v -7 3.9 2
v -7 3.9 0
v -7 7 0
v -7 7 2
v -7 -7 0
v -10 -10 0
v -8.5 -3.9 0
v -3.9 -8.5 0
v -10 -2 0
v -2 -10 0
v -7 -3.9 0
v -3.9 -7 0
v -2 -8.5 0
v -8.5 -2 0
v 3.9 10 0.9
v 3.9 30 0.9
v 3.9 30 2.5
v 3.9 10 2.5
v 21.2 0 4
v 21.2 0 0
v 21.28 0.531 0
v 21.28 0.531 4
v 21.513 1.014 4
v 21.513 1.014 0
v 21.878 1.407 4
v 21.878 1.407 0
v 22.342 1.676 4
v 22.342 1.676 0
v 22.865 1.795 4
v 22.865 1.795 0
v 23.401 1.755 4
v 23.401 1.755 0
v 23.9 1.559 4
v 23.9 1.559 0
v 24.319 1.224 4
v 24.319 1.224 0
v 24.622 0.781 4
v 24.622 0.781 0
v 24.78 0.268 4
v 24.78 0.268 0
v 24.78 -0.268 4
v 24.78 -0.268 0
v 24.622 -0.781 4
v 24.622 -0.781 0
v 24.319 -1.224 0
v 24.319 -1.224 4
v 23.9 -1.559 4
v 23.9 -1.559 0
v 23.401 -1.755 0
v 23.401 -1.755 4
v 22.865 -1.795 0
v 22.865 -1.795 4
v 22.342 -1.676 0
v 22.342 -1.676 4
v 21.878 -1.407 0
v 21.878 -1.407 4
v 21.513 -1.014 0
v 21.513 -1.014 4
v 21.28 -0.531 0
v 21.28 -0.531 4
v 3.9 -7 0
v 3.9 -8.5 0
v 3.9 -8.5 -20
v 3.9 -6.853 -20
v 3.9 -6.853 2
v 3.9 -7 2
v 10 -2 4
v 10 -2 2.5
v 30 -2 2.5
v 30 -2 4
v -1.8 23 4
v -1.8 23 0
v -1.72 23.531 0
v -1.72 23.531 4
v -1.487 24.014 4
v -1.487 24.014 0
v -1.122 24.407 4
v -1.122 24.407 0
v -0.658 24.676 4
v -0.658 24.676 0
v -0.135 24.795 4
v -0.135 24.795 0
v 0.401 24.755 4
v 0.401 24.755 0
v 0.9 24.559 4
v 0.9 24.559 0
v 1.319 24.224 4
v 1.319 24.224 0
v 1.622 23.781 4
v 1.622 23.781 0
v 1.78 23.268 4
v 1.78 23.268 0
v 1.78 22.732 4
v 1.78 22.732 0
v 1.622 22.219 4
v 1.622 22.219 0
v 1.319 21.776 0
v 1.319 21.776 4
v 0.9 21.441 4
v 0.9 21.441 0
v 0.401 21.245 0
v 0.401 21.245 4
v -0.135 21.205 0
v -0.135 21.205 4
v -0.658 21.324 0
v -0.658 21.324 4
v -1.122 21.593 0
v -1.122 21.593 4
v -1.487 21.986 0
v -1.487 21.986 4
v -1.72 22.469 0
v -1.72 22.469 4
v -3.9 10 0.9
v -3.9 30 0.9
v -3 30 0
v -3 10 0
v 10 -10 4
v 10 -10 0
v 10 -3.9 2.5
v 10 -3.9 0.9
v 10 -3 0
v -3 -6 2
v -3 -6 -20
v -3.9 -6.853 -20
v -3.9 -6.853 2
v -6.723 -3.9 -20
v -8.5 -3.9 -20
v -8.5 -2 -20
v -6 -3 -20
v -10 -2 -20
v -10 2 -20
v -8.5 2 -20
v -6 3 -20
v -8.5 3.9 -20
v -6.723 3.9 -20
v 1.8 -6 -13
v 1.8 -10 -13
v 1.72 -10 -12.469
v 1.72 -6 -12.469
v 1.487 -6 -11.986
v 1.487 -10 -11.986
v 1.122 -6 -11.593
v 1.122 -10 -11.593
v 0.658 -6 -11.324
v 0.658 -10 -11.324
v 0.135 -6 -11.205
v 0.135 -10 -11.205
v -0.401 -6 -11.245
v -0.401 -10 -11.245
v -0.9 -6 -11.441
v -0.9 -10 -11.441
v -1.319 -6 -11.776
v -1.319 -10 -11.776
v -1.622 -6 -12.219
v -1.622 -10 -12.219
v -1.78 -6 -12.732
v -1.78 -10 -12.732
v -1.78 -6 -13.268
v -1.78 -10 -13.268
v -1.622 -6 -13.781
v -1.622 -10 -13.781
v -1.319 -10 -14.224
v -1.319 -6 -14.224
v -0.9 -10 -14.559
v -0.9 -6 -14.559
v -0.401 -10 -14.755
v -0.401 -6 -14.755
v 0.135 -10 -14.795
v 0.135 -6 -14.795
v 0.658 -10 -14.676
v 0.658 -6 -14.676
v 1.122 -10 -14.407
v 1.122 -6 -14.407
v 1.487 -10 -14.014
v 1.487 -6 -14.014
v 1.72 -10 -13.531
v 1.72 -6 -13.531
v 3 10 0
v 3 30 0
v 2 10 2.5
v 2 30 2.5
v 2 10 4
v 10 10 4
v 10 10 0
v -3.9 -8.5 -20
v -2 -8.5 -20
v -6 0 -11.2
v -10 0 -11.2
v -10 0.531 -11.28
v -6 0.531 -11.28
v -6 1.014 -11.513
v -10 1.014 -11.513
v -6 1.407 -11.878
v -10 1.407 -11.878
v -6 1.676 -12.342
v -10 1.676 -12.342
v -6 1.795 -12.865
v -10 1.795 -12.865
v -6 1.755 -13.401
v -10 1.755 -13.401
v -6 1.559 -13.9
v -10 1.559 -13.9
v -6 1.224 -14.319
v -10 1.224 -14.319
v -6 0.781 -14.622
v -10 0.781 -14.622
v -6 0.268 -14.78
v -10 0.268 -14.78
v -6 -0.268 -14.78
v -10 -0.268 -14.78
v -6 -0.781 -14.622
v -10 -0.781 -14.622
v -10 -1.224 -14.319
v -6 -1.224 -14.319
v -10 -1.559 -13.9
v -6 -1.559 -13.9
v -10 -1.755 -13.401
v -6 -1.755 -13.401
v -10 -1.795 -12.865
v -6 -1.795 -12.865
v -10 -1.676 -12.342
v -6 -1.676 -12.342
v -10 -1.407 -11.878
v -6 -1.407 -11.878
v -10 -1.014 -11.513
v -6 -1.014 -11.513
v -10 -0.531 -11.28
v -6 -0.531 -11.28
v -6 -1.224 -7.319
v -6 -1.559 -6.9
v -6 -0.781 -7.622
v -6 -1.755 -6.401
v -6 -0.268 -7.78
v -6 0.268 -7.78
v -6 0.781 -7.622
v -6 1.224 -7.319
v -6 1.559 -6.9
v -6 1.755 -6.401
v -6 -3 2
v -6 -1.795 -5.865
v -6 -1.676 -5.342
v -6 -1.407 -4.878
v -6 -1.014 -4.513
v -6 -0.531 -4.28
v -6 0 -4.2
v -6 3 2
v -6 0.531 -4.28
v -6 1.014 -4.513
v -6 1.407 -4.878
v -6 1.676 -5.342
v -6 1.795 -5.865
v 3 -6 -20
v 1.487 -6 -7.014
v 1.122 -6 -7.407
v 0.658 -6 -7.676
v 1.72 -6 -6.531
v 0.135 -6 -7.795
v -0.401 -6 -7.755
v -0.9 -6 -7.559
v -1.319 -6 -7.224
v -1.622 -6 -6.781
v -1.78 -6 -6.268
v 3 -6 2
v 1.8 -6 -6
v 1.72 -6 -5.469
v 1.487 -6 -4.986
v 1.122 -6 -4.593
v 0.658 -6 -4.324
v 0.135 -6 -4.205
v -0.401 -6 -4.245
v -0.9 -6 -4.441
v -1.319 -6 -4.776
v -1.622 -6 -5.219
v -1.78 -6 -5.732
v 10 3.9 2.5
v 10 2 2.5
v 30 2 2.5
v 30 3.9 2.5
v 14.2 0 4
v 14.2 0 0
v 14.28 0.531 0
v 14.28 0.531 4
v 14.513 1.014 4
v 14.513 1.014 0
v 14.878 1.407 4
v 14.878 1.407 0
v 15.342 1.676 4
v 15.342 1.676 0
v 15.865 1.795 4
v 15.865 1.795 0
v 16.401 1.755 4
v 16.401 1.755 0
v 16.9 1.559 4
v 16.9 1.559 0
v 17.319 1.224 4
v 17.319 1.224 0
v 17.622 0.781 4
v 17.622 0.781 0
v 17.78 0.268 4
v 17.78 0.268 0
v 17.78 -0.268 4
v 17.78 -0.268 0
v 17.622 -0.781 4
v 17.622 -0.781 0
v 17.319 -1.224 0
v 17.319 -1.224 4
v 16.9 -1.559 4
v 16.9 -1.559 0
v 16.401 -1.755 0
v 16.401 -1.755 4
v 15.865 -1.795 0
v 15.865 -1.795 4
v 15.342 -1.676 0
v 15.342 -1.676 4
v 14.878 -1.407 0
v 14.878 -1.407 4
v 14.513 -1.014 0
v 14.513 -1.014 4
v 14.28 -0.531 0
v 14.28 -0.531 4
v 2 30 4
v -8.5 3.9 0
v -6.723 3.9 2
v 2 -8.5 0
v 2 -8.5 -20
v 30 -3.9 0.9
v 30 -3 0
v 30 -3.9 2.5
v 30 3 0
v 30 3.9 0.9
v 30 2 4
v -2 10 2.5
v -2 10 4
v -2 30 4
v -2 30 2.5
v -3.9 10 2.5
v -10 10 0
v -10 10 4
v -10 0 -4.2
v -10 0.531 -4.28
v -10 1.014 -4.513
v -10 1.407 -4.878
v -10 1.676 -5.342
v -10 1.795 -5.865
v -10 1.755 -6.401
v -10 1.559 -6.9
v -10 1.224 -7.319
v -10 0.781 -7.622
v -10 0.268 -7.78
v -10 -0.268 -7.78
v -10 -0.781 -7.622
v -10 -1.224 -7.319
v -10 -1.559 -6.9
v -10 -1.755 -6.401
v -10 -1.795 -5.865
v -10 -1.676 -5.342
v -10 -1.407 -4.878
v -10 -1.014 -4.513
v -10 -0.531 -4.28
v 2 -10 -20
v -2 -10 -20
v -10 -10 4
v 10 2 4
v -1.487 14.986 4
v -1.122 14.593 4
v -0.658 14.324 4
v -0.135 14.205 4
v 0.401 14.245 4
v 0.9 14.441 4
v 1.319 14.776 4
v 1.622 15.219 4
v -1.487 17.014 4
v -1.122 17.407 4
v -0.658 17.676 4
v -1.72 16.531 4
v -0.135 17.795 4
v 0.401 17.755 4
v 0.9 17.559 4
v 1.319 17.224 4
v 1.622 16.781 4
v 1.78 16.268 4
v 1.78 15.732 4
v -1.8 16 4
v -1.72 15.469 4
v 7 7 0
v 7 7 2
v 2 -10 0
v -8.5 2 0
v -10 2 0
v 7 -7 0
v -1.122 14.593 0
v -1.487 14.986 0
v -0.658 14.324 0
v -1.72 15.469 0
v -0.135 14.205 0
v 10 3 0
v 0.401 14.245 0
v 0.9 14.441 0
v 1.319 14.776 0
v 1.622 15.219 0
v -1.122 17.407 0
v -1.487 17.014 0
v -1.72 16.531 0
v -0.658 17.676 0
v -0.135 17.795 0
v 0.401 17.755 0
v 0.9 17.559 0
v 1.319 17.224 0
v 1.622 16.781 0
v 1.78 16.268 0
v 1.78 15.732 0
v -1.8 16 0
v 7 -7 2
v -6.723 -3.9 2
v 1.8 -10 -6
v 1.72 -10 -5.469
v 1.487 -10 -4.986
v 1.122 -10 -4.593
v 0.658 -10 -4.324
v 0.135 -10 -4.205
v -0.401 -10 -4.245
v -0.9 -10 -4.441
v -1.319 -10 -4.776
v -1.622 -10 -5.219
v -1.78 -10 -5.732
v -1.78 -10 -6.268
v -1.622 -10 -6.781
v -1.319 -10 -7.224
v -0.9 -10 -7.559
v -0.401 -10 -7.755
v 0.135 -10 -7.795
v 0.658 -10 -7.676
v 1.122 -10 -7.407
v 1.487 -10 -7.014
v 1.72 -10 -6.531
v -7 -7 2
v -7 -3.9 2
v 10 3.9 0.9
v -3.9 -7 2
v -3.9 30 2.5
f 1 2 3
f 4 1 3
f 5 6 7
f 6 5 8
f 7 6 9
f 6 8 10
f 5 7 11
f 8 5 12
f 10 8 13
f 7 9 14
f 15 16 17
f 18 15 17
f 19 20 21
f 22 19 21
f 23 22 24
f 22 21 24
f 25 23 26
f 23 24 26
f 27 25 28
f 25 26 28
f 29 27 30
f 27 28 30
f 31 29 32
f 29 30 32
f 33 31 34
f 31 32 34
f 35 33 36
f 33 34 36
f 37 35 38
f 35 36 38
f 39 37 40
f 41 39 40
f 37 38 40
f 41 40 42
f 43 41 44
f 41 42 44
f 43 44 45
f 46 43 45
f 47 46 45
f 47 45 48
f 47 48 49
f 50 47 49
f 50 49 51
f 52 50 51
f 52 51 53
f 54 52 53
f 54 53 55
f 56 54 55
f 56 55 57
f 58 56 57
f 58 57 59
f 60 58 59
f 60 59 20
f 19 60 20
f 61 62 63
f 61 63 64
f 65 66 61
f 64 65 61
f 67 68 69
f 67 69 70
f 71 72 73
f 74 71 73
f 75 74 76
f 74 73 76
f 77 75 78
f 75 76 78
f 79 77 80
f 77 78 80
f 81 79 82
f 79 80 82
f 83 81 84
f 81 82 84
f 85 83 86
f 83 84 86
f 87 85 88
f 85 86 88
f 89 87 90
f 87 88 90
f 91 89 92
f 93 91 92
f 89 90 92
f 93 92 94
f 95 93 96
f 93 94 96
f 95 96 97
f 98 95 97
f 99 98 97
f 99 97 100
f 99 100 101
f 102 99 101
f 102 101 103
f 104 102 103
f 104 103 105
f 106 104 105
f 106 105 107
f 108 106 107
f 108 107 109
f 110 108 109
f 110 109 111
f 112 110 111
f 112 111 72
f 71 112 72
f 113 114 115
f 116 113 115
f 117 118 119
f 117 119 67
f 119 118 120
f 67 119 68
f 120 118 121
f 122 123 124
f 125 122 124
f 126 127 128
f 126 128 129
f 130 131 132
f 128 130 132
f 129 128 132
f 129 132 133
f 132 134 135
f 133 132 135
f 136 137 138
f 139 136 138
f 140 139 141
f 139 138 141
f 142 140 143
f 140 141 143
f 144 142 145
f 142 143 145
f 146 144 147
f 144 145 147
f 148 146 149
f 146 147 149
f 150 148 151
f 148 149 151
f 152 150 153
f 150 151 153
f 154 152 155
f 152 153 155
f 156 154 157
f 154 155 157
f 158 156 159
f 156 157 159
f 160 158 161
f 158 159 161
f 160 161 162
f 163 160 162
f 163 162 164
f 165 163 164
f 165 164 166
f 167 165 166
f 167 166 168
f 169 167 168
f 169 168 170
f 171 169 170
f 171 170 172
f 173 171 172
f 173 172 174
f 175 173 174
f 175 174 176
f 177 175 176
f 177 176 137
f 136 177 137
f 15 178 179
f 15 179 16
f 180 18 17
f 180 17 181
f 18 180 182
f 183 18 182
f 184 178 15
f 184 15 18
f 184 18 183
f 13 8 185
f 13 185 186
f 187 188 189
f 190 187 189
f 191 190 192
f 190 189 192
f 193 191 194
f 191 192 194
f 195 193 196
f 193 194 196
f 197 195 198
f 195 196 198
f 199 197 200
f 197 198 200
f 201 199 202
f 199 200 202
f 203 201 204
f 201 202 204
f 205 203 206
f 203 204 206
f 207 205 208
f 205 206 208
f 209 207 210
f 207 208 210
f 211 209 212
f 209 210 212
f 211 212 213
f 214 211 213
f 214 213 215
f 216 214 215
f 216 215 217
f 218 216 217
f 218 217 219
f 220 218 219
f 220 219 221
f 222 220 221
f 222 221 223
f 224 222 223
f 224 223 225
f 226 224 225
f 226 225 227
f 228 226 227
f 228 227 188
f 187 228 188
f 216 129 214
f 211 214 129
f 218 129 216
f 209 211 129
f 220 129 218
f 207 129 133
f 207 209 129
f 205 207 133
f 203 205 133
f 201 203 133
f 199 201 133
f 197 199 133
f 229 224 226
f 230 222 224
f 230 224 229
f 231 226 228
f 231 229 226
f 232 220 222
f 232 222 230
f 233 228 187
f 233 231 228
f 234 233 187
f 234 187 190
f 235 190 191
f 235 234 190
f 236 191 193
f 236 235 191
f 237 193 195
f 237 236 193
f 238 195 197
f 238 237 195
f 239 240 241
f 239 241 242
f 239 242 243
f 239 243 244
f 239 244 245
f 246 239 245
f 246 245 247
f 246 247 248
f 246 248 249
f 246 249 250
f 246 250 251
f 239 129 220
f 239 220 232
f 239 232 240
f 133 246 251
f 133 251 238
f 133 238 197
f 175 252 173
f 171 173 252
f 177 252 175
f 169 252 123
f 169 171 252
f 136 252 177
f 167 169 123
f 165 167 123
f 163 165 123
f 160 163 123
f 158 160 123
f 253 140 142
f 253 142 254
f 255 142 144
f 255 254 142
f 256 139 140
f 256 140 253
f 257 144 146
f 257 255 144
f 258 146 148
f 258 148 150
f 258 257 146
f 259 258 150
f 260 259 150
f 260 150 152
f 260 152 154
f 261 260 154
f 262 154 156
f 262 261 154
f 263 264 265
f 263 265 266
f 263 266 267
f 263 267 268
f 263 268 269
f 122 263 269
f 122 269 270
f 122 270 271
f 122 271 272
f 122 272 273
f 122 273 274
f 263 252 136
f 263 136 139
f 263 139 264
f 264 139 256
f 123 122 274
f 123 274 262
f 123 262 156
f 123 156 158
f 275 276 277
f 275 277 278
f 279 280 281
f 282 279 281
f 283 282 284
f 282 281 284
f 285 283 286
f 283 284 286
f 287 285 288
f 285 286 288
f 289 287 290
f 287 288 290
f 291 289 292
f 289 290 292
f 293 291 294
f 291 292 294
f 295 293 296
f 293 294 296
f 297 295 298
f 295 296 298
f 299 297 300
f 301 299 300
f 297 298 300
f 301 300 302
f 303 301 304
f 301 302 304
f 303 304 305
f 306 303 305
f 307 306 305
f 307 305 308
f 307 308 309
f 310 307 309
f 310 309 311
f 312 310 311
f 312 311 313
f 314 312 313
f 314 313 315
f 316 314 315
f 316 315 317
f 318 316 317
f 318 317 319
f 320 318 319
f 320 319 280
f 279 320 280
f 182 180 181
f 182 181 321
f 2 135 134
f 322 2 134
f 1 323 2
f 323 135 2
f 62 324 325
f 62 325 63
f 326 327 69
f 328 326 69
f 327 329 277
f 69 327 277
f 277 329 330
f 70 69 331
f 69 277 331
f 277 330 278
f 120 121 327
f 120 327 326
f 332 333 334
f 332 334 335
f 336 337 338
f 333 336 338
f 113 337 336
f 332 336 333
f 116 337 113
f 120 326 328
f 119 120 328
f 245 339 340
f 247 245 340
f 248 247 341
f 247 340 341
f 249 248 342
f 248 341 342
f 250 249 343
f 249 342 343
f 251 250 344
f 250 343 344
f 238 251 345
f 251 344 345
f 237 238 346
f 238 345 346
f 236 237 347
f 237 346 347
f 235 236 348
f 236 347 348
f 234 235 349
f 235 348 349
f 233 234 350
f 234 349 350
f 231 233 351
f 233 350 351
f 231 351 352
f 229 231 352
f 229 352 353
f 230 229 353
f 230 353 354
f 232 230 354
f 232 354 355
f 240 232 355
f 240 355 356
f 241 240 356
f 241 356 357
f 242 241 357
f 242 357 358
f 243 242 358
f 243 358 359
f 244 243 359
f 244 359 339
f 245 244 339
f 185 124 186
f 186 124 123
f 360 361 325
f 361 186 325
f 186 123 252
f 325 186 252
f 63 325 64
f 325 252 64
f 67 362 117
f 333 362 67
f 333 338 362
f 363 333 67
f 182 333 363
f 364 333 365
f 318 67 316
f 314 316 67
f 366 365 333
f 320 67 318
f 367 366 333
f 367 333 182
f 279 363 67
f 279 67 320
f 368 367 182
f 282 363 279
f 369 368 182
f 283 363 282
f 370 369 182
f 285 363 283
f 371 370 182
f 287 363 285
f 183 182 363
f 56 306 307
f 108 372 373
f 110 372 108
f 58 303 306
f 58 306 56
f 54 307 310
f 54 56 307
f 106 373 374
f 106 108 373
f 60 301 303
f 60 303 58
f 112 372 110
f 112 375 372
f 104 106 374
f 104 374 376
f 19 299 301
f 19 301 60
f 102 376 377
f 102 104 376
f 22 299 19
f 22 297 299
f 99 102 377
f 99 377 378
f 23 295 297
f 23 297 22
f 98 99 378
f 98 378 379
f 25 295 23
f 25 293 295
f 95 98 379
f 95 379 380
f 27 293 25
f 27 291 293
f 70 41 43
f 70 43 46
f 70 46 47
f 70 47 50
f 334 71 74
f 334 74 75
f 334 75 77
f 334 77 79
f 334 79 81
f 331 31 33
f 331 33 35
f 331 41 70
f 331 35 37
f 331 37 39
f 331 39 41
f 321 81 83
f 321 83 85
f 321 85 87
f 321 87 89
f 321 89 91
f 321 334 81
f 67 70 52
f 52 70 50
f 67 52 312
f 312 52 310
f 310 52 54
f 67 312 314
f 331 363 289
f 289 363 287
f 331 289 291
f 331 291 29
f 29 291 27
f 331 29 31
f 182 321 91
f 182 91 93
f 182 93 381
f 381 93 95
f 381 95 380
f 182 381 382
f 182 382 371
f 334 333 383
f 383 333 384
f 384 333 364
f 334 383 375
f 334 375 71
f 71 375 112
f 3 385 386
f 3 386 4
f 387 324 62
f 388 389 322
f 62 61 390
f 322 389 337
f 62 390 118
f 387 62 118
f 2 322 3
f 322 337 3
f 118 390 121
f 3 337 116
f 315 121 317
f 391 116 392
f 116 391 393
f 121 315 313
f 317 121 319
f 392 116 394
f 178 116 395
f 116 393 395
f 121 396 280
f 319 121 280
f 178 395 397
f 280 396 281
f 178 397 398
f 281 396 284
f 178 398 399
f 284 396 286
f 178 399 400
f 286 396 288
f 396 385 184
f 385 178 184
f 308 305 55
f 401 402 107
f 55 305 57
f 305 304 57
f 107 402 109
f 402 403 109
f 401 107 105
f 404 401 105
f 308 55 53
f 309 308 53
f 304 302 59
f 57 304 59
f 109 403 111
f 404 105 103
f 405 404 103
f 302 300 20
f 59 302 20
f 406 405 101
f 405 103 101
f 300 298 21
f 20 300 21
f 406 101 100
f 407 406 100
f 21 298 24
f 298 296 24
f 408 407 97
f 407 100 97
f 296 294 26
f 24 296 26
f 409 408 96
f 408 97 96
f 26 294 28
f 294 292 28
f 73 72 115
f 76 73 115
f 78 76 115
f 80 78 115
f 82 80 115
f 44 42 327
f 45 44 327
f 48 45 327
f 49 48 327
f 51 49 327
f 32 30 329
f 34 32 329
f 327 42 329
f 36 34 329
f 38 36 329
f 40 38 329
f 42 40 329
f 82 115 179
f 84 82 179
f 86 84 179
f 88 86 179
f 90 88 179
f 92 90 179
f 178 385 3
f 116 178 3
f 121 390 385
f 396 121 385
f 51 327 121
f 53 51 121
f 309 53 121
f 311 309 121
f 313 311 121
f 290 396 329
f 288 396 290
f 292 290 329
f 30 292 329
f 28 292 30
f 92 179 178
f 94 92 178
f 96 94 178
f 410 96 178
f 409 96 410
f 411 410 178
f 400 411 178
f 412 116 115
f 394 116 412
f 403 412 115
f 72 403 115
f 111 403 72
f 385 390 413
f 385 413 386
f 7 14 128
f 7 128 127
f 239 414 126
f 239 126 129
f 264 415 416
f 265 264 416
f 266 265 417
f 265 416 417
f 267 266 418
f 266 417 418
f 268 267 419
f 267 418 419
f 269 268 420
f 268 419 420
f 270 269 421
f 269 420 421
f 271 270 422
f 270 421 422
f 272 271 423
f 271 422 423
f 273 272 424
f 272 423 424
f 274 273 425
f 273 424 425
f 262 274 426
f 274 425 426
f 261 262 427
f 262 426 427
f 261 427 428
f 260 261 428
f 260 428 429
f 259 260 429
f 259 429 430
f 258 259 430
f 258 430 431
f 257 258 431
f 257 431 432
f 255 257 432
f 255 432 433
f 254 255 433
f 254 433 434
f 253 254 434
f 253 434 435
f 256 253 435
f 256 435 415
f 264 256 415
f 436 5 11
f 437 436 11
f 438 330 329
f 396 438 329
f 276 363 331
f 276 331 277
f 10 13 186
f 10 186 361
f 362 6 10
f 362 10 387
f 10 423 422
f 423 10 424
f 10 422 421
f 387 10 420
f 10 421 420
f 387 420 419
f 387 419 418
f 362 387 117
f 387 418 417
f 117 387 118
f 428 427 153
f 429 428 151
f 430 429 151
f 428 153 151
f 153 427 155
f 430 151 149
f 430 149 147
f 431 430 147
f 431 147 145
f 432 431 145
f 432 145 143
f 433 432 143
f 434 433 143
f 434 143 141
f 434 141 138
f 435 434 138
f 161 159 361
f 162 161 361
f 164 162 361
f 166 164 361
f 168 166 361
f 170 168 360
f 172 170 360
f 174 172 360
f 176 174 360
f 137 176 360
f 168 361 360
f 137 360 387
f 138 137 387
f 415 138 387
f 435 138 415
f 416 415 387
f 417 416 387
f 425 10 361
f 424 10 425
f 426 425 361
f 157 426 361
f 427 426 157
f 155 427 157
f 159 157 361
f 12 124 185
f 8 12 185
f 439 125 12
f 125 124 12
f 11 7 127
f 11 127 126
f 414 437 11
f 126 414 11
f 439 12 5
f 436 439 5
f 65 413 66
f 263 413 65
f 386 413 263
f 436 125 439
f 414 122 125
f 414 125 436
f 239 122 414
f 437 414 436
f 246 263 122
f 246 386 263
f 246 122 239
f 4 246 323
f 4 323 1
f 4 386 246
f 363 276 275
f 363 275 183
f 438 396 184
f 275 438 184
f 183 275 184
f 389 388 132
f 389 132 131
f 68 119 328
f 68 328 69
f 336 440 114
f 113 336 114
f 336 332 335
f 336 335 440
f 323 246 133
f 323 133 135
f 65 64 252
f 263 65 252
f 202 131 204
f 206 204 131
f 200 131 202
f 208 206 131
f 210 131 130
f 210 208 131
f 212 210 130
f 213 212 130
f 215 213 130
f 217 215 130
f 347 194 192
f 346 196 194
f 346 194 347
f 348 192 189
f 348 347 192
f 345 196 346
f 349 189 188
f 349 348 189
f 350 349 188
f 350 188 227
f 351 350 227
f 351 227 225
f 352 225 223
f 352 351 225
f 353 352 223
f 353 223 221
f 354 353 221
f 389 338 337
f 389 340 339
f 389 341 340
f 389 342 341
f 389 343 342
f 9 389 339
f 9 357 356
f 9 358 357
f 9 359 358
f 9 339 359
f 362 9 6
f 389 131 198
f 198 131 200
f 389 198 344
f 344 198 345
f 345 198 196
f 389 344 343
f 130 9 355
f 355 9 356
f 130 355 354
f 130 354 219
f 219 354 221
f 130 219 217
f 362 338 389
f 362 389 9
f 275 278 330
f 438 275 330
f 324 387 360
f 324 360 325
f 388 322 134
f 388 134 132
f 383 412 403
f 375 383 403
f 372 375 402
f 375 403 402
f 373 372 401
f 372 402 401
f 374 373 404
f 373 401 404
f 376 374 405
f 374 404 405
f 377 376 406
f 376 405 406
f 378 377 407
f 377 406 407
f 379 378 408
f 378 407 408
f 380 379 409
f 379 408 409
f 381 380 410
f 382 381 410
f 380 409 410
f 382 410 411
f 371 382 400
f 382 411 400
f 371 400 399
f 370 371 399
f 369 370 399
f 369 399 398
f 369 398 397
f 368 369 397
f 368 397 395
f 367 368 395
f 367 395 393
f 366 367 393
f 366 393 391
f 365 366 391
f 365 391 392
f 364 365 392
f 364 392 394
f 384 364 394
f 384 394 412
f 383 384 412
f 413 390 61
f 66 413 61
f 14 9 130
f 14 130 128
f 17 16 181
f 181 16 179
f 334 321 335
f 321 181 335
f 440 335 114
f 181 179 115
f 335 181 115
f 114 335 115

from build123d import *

# Parameters (mm, degrees)
SKETCH_1_W           = 20
SKETCH_1_H           = 20
EXTRUDE_1_DEPTH      = 4
SKETCH_2_W           = 14
SKETCH_2_H           = 14
CUT_EXTRUDE_1_DEPTH  = 2
EXTRUDE_2_DEPTH      = 20
EXTRUDE_3_DEPTH      = 20
EXTRUDE_4_DEPTH      = 20
EXTRUDE_4_DEPTH_BACK = 4
SKETCH_7_R           = 1.8
CUT_EXTRUDE_5_DEPTH  = 41
SKETCH_8_R           = 1.8
CUT_EXTRUDE_6_DEPTH  = 20
SKETCH_9_R           = 1.8
CUT_EXTRUDE_7_DEPTH  = 20


with BuildPart() as part:
    # 草图1 → 凸台-拉伸1 (new body)
    with BuildSketch(Plane.XY):
        Rectangle(SKETCH_1_W, SKETCH_1_H)
    extrude(amount=EXTRUDE_1_DEPTH)

    # 草图2 → 切除-拉伸1 (cut)
    with BuildSketch(Plane(origin=(0, 0, 0), x_dir=(-1, 0, 0), z_dir=(0, 0, -1))):
        Rectangle(SKETCH_2_W, SKETCH_2_H)
    extrude(amount=-CUT_EXTRUDE_1_DEPTH, mode=Mode.SUBTRACT)

    # 草图3 → 凸台-拉伸2 (add)
    with BuildSketch(Plane(origin=(10, 0, 0), x_dir=(0, 0, -1), z_dir=(1, 0, 0))):
        Polygon((-4, -2), (-4, 2), (-2.5, 2), (-2.5, 3.9), (-0.9, 3.9), (0, 3), (0, -3), (-0.9, -3.9), (-2.5, -3.9), (-2.5, -2), align=None)
    extrude(amount=EXTRUDE_2_DEPTH)

    # 草图5 → 凸台-拉伸3 (add)
    with BuildSketch(Plane(origin=(0, 10, 0), x_dir=(1, 0, 0), z_dir=(0, 1, 0))):
        Polygon((2, -4), (-2, -4), (-2, -2.5), (-3.9, -2.5), (-3.9, -0.9), (-3, 0), (3, 0), (3.9, -0.9), (3.9, -2.5), (2, -2.5), align=None)
    extrude(amount=EXTRUDE_3_DEPTH)

    # 草图6 → 凸台-拉伸4 (add, two sides)
    with BuildSketch(Plane(origin=(0, 0, 0), x_dir=(-1, 0, 0), z_dir=(0, 0, -1))) as extrude_4_sk:
        Polygon((10, 2), (10, -2), (8.5, -2), (8.5, -3.9), (6.723155125, -3.9), (6, -3), (6, 3), (6.723155125, 3.9), (8.5, 3.9), (8.5, 2), align=None)
        Polygon((2, -10), (-2, -10), (-2, -8.5), (-3.9, -8.5), (-3.9, -6.853318906), (-3, -6), (3, -6), (3.9, -6.853318906), (3.9, -8.5), (2, -8.5), align=None)
    extrude(amount=EXTRUDE_4_DEPTH)
    extrude(extrude_4_sk.sketch, amount=-EXTRUDE_4_DEPTH_BACK)

    # 草图7 → 切除-拉伸5 (cut, through all)
    with BuildSketch(Plane.ZY.offset(10)):
        with Locations((-6, 0)):
            Circle(SKETCH_7_R)
        with Locations((-13, 0)):
            Circle(SKETCH_7_R)
    extrude(amount=-CUT_EXTRUDE_5_DEPTH, mode=Mode.SUBTRACT)

    # 草图8 → 切除-拉伸6 (cut)
    with BuildSketch(Plane(origin=(0, 0, 0), x_dir=(-1, 0, 0), z_dir=(0, 0, -1))):
        with Locations((-16, 0)):
            Circle(SKETCH_8_R)
        with Locations((0, 16)):
            Circle(SKETCH_8_R)
        with Locations((0, 23)):
            Circle(SKETCH_8_R)
        with Locations((-23, 0)):
            Circle(SKETCH_8_R)
    extrude(amount=-CUT_EXTRUDE_6_DEPTH, mode=Mode.SUBTRACT)

    # 草图9 → 切除-拉伸7 (cut)
    with BuildSketch(Plane.XZ.offset(10)):
        with Locations((0, -6)):
            Circle(SKETCH_9_R)
        with Locations((0, -13)):
            Circle(SKETCH_9_R)
    extrude(amount=-CUT_EXTRUDE_7_DEPTH, mode=Mode.SUBTRACT)


solid = part.part
